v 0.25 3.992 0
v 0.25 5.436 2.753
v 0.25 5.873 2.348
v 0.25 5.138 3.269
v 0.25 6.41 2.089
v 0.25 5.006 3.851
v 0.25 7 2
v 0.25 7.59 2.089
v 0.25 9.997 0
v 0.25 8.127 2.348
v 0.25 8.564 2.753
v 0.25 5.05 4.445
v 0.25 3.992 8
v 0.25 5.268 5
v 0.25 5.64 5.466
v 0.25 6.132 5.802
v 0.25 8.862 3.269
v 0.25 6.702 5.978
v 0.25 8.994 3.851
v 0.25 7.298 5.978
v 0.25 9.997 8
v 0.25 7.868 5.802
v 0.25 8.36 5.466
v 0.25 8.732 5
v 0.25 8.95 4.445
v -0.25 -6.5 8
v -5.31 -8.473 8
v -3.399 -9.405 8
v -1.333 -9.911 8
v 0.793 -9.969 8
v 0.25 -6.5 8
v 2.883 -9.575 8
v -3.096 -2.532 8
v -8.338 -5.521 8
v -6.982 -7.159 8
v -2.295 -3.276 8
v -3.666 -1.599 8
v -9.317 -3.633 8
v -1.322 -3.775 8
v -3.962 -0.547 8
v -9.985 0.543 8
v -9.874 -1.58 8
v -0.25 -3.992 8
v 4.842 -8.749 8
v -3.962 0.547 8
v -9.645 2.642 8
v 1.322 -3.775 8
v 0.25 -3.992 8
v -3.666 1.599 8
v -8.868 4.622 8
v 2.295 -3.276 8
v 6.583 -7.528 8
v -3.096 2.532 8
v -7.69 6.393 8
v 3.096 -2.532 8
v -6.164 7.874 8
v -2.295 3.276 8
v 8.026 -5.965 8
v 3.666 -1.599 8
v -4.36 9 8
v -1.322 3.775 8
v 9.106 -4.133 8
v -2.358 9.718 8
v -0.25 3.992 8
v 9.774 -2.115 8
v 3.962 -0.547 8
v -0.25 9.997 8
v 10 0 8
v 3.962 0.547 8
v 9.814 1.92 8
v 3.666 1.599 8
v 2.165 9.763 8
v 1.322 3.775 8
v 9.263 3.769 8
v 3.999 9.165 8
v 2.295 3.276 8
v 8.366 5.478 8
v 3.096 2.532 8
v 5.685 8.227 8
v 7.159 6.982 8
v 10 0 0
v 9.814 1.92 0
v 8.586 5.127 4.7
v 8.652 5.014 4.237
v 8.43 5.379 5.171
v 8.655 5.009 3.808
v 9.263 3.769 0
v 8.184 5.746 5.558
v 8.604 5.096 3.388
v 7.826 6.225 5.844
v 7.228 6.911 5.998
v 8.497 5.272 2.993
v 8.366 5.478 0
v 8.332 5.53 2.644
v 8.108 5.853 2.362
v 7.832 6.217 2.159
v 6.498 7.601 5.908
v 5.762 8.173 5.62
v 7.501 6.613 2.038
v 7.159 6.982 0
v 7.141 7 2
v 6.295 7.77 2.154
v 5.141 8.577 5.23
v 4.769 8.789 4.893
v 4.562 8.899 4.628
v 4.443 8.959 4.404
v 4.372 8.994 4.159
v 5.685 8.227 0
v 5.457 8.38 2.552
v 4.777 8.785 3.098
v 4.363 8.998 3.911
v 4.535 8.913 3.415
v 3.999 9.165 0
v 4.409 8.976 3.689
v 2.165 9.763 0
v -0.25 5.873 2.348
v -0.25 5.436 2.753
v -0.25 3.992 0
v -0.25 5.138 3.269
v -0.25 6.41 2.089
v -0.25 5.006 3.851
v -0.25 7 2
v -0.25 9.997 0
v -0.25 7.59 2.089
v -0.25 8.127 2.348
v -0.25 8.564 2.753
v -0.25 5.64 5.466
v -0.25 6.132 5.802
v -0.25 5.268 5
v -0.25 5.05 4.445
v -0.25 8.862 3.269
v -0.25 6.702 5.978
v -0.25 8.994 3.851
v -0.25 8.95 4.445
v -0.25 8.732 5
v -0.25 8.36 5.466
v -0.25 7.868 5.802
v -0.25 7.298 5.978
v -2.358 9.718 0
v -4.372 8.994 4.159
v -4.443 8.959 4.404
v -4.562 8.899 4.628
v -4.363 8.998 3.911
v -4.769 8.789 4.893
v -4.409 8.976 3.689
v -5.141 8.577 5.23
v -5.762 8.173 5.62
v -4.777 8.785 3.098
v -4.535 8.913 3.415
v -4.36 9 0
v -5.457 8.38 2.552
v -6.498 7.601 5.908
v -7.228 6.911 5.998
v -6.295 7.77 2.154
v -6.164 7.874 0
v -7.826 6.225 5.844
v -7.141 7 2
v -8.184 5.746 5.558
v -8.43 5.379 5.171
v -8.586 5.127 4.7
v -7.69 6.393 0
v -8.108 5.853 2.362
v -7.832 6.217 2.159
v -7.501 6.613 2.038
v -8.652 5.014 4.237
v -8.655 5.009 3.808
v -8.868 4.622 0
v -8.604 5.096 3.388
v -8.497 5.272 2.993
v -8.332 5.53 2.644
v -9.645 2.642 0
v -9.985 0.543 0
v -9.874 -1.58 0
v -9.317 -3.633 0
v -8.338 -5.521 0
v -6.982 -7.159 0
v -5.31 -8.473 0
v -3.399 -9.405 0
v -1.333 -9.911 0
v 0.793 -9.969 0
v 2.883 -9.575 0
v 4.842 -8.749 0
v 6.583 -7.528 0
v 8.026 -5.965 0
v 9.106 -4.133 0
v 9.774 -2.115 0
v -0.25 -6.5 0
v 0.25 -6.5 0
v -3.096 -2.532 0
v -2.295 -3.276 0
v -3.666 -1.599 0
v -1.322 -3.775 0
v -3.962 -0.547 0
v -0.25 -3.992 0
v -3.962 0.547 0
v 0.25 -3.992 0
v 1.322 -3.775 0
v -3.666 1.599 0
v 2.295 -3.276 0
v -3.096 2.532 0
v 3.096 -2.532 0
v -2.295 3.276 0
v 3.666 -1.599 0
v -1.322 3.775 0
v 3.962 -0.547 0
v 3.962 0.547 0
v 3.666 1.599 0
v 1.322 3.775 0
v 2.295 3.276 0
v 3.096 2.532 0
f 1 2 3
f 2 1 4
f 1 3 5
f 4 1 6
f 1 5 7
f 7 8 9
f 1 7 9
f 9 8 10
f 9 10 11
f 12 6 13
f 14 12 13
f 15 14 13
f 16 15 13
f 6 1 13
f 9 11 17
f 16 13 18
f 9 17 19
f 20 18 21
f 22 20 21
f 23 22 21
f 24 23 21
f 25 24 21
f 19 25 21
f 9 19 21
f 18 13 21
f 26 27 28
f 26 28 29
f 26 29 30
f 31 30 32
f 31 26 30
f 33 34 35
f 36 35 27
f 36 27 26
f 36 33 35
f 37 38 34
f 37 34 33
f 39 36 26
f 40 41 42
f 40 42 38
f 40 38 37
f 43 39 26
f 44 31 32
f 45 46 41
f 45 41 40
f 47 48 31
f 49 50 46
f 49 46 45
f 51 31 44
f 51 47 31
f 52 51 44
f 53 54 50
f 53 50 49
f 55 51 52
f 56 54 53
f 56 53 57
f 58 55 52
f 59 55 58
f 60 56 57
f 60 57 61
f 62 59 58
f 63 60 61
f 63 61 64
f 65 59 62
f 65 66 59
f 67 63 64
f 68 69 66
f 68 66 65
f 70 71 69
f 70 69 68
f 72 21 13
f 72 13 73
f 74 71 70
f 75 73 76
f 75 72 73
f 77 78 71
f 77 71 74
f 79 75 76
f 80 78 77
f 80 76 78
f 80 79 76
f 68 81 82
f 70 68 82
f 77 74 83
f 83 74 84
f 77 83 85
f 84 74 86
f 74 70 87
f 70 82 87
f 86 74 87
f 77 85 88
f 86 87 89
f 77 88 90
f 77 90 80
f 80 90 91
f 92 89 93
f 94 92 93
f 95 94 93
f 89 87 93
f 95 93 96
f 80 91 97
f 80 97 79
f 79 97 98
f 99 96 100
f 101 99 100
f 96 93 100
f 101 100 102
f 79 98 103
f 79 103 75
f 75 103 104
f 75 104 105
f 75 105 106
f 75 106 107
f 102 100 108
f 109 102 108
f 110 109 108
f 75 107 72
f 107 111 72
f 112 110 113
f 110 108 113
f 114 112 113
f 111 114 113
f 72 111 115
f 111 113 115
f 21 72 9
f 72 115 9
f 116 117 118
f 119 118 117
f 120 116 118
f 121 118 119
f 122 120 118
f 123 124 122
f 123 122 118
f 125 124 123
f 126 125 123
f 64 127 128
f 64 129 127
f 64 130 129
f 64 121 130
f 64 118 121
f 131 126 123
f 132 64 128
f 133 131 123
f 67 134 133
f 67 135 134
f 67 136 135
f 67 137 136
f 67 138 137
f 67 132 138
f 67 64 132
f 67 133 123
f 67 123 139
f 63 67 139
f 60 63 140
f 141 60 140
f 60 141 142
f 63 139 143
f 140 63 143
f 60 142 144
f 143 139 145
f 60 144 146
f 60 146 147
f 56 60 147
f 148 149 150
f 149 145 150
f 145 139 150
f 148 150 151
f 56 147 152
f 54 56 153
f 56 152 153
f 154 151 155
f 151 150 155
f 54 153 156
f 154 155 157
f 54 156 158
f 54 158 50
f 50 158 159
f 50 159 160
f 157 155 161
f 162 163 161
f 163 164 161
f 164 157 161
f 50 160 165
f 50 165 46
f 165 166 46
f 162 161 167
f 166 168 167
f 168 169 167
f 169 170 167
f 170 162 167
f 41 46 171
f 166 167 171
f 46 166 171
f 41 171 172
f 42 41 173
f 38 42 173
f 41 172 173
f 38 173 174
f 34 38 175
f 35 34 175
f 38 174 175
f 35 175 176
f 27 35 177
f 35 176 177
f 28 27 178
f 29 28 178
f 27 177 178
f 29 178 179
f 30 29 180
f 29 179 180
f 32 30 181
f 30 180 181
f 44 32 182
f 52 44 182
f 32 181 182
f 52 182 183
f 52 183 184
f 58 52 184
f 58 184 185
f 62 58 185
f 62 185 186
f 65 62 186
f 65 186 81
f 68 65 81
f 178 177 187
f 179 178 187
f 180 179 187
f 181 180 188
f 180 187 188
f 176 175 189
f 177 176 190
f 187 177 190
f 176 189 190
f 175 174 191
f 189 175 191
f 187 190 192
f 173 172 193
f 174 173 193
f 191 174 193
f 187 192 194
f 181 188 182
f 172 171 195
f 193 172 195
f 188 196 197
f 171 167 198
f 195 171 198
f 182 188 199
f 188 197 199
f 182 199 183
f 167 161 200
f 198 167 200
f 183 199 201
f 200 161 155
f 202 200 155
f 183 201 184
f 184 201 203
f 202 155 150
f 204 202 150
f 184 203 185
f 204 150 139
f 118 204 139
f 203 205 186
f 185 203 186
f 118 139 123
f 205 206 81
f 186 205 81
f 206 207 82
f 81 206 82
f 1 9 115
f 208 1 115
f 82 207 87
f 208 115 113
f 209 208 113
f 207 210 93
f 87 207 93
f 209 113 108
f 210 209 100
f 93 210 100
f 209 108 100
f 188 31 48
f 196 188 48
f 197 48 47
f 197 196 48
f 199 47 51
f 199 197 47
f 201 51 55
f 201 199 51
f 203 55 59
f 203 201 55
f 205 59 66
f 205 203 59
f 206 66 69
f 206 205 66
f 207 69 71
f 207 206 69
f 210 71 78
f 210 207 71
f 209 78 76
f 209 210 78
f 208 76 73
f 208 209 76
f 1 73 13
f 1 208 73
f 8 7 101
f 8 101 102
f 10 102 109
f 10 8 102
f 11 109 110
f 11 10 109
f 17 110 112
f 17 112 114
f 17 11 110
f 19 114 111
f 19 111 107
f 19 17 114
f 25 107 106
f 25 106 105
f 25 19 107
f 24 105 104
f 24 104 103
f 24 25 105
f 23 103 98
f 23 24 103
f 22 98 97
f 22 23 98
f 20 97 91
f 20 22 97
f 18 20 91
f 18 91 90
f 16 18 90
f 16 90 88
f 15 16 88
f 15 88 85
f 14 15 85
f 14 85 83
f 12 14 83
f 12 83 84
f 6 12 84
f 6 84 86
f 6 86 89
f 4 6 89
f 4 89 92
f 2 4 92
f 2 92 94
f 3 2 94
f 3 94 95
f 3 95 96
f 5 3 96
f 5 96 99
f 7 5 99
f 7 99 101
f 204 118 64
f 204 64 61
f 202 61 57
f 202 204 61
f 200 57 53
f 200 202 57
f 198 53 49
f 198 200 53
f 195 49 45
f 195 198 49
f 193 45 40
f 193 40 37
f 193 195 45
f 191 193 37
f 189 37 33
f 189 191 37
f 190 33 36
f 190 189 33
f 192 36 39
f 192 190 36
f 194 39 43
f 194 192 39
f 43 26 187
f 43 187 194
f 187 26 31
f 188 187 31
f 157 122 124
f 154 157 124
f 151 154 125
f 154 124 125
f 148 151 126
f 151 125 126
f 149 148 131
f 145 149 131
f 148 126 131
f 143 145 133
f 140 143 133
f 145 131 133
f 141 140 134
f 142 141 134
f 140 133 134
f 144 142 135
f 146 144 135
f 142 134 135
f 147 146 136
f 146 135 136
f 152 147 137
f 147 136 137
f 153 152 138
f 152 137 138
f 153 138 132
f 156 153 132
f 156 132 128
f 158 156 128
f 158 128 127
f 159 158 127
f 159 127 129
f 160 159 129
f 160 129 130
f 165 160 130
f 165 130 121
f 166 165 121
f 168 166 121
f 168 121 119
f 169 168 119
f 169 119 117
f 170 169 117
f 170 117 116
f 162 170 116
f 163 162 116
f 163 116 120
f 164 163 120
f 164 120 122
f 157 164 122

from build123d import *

# Parameters (mm, degrees)
SKETCH1_R               = 10
SKETCH1_R_2             = 4
BOSS_EXTRUDE1_DEPTH     = 8
SKETCH2_W               = 0.5
SKETCH2_H               = 17
CUT_EXTRUDE1_DEPTH      = 8
SKETCH3_R               = 2
CUT_EXTRUDE2_DEPTH      = 11
CUT_EXTRUDE2_DEPTH_BACK = 11


with BuildPart() as part:
    # Sketch1 → Boss-Extrude1 (new body)
    with BuildSketch(Plane.XY):
        Circle(SKETCH1_R)
        Circle(SKETCH1_R_2, mode=Mode.SUBTRACT)
    extrude(amount=BOSS_EXTRUDE1_DEPTH)

    # Sketch2 → Cut-Extrude1 (cut)
    with BuildSketch(Plane.XY.offset(8)):
        with Locations((0, 2)):
            Rectangle(SKETCH2_W, SKETCH2_H)
    extrude(amount=-CUT_EXTRUDE1_DEPTH, mode=Mode.SUBTRACT)

    # Sketch3 → Cut-Extrude2 (cut, two sides)
    with BuildSketch(Plane(origin=(0, 0, 0), x_dir=(0, 0, -1), z_dir=(1, 0, 0))) as cut_extrude2_sk:
        with Locations((-4, 7)):
            Circle(SKETCH3_R)
    extrude(amount=CUT_EXTRUDE2_DEPTH, mode=Mode.SUBTRACT)
    extrude(cut_extrude2_sk.sketch, amount=-CUT_EXTRUDE2_DEPTH_BACK, mode=Mode.SUBTRACT)


solid = part.part
